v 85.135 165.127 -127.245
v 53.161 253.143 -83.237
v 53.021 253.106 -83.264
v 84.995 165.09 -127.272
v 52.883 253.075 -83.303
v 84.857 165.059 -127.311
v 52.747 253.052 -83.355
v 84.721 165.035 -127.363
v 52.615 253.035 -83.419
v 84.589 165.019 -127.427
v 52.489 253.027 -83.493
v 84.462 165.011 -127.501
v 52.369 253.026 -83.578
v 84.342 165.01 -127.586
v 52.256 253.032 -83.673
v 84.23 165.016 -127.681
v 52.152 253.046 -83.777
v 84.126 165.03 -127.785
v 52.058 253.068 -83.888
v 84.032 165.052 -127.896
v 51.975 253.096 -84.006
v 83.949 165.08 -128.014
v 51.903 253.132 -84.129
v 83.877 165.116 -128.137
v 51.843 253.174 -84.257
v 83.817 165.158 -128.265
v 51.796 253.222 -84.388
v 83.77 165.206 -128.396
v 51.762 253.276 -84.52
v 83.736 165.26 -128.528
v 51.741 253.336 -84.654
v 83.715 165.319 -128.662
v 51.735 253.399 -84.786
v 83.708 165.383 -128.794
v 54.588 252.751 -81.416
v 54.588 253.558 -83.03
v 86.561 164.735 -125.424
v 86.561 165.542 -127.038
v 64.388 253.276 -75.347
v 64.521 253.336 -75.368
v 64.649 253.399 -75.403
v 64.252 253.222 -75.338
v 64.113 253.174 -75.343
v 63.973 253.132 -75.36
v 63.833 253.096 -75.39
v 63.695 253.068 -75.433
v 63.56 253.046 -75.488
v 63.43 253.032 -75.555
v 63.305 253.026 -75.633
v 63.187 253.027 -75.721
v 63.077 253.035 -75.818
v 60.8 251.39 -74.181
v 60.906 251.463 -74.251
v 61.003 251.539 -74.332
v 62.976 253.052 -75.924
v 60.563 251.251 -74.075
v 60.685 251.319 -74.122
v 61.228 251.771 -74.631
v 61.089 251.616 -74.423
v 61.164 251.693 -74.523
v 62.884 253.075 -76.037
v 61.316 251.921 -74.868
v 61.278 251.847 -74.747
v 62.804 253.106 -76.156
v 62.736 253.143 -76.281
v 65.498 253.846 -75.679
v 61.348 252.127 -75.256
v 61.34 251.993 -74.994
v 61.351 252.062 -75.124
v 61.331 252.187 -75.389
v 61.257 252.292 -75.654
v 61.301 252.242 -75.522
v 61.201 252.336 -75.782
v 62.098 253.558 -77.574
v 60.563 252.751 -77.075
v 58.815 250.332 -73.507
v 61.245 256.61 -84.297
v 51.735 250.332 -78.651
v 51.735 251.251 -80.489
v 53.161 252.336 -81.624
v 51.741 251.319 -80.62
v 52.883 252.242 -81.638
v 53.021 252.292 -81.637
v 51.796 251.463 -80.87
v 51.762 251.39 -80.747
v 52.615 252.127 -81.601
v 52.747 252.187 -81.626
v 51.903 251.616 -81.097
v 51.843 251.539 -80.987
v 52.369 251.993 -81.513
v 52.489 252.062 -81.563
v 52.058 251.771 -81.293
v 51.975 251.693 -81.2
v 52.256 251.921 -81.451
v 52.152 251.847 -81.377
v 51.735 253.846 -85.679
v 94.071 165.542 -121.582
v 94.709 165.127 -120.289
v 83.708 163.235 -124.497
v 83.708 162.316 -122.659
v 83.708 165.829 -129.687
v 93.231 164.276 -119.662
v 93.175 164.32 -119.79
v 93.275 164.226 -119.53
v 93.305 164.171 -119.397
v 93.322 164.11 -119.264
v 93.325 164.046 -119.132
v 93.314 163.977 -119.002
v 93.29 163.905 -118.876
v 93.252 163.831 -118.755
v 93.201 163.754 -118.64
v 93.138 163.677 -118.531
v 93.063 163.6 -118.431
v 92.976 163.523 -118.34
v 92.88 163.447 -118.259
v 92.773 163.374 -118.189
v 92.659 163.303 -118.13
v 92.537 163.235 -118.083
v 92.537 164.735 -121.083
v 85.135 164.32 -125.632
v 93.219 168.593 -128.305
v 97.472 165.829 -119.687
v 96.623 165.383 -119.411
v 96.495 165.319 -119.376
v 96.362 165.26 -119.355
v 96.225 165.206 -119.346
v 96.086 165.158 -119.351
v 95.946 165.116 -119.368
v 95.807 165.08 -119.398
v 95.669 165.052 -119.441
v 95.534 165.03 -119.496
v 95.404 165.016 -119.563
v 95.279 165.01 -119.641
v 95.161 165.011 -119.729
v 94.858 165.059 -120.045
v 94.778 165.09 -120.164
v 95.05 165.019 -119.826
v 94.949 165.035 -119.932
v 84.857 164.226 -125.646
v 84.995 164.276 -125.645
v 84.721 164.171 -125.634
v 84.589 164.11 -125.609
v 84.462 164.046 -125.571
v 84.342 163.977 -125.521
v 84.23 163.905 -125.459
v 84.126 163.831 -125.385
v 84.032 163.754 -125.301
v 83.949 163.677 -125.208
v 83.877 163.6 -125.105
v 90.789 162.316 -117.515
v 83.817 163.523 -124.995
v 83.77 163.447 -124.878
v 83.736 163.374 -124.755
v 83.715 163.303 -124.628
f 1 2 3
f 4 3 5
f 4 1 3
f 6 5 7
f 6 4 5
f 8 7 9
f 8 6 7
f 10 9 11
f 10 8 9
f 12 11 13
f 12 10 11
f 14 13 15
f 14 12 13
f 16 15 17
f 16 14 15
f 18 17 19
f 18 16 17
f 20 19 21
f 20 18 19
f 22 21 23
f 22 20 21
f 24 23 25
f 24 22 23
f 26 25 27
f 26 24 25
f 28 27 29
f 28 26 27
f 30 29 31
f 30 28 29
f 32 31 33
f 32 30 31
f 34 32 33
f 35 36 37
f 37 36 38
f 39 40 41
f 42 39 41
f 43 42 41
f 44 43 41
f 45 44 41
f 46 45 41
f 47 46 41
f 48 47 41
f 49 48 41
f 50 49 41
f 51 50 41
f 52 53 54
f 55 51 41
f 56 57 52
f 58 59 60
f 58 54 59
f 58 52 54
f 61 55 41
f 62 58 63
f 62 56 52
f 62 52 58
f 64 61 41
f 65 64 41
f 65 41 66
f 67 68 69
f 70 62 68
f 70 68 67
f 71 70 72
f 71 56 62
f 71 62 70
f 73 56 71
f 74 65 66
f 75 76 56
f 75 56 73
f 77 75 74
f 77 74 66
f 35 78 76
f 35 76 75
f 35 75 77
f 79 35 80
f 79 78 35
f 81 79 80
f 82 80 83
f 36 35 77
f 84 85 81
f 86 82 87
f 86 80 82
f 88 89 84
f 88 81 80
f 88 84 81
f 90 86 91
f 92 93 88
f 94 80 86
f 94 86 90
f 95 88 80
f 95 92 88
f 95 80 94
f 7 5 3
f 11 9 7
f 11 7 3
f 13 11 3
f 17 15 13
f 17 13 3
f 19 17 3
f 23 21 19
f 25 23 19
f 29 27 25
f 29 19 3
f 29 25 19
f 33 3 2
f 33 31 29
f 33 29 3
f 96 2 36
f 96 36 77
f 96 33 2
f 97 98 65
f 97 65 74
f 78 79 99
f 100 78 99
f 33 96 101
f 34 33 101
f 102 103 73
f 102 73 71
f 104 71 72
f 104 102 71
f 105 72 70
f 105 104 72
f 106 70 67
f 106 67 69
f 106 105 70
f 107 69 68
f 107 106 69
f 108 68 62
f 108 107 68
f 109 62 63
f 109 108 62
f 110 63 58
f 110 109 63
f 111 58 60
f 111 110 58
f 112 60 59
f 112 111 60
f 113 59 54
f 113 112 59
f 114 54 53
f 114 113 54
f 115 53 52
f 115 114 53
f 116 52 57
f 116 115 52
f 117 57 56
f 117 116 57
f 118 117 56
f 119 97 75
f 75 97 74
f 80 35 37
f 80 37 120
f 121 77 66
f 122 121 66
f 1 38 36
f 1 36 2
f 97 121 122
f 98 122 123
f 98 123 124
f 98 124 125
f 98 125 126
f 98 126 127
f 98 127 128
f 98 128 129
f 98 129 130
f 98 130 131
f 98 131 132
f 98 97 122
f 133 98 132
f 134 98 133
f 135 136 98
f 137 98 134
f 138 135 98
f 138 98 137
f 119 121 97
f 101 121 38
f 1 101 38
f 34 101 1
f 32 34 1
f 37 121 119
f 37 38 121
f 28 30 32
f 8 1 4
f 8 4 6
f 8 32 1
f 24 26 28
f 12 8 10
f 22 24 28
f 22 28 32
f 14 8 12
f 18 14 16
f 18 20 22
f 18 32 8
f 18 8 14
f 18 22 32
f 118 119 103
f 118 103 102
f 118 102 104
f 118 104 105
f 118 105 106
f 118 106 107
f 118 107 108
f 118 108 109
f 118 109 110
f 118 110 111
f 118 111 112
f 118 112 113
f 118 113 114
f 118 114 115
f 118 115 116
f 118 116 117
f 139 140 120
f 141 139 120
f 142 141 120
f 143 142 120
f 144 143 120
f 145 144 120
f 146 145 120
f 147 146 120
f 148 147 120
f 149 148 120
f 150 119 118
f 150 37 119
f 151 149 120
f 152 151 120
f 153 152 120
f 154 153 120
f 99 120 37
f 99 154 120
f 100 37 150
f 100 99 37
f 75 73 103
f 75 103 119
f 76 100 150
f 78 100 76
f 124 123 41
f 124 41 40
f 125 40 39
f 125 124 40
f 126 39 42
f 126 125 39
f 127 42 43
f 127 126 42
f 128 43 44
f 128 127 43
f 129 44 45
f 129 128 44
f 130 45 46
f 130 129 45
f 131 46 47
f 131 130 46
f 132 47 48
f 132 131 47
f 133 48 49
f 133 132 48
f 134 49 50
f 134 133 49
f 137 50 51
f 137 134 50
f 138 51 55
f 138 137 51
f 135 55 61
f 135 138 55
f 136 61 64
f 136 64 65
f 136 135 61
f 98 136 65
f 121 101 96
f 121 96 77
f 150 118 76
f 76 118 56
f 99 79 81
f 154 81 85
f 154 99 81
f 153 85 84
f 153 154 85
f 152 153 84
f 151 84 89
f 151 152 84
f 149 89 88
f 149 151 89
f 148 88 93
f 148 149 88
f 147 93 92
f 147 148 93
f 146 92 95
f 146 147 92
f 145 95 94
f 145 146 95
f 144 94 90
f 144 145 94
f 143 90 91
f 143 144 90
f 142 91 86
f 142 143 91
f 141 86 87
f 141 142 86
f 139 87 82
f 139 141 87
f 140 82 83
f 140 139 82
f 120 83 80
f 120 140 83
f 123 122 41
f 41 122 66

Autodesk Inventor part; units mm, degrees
sketch "Boceto2" plane through (0, 0, 0) normal (0, 1, 0) x (-1, 0, 0)
  line L0 (0, -100.3768) -> (-95.464, -31.0181)
  line L1 (-95.464, -31.0181) -> (-59, 81.2065)
  line L2 (-59, 81.2065) -> (59, 81.2065)
  line L3 (59, 81.2065) -> (95.464, -31.0181)
  line L4 (95.464, -31.0181) -> (0, -100.3768)
  line L5 (0, 0) -> (162.4131, 0) construction
  line L6 (162.4131, 0) -> (162.4131, 162.4131) construction
  line L7 (162.4131, 162.4131) -> (0, 162.4131) construction
  line L8 (0, 162.4131) -> (0, 0) construction
  line L9 (162.4131, 162.4131) -> (0, 81.2065) construction
  dimension "Lado" = 118
  dimension "d1" = 26.565
  dimension "d2" = 262.7899
extrude "Extrusión1" add sketch "Boceto2" along normal blind 262.7899 draft 26.565
sketch "Boceto3" plane through (0, 262.7899, 0) normal (0, 1, 0) x (1, 0, 0)
  line L0 (0, -100.3768) -> (-95.464, -31.0181)
  line L1 (-95.464, -31.0181) -> (-59, 81.2065)
  line L2 (-59, 81.2065) -> (59, 81.2065)
  line L3 (59, 81.2065) -> (95.464, -31.0181)
  line L4 (95.464, -31.0181) -> (0, -100.3768)
  point P0 (0, 0)
  point P1 (0, 0)
  dimension "d5" = 118
extrude "Extrusión2" cut sketch "Boceto3" against normal blind 262.7899 draft 26.565 keep common part
sketch "Boceto4" plane through (-95.464, 262.7899, 31.0181) normal (-0.5257311, 0.4472136, 0.7236068) x (0.809017, 0, 0.5877853)
  line L0 (-36.464, -112.2247) -> (59, -181.5833) projected
  line L1 (59, -181.5833) -> (154.464, -112.2247) projected
  line L2 (118, 0) -> (154.464, -112.2247) projected
  line L3 (118, 0) -> (0, 0) projected
  line L4 (0, 0) -> (-36.464, -112.2247) projected
  line L5 (59, -167.9866) -> (-23.5327, -108.023)
  line L6 (-23.5327, -108.023) -> (7.992, -11)
  line L7 (7.992, -11) -> (110.008, -11)
  line L8 (110.008, -11) -> (141.5327, -108.023)
  line L9 (141.5327, -108.023) -> (59, -167.9866)
  point P0 (59, -198.7297)
  dimension "Ancho_Marco" = 11
extrude "Extrusión3" cut sketch "Boceto4" against normal blind 162.7899 contours L5 L6 L7 L8 L9
sketch "Boceto5" plane through (-59, 0, 81.2065) normal (0, -0.4472136, 0.8944272) x (1, 0, 0)
  line L0 (-36.464, 112.2247) -> (59, 181.5833) projected
  line L1 (0, 0) -> (-36.464, 112.2247) projected
  line L2 (0, 0) -> (118, 0) projected
  line L3 (118, 0) -> (154.464, 112.2247) projected
  line L4 (59, 181.5833) -> (154.464, 112.2247) projected
  line L5 (-23.5327, 108.023) -> (59, 167.9866)
  line L6 (59, 167.9866) -> (141.5327, 108.023)
  line L7 (141.5327, 108.023) -> (110.008, 11)
  line L8 (110.008, 11) -> (7.992, 11)
  line L9 (7.992, 11) -> (-23.5327, 108.023)
  point P0 (59, -36.3167)
  dimension "d11" = 11
sketch "Boceto6" plane through (-95.464, 0, -31.0181) normal (-0.8506508, -0.4472136, 0.2763932) x (0.309017, 0, 0.9510565)
  line L0 (-36.464, 112.2247) -> (59, 181.5833) projected
  line L1 (0, 0) -> (-36.464, 112.2247) projected
  line L2 (0, 0) -> (118, 0) projected
  line L3 (118, 0) -> (154.464, 112.2247) projected
  line L4 (59, 181.5833) -> (154.464, 112.2247) projected
  line L5 (-23.5327, 108.023) -> (59, 167.9866)
  line L6 (59, 167.9866) -> (141.5327, 108.023)
  line L7 (141.5327, 108.023) -> (110.008, 11)
  line L8 (110.008, 11) -> (7.992, 11)
  line L9 (7.992, 11) -> (-23.5327, 108.023)
  point P0 (59, -36.3167)
  dimension "d12" = 11
sketch "Boceto7" plane through (-59, 262.7899, -81.2065) normal (-0.8506508, 0.4472136, -0.2763932) x (-0.309017, 0, 0.9510565)
  line L0 (-36.464, -112.2247) -> (59, -181.5833) projected
  line L1 (59, -181.5833) -> (154.464, -112.2247) projected
  line L2 (118, 0) -> (154.464, -112.2247) projected
  line L3 (118, 0) -> (0, 0) projected
  line L4 (0, 0) -> (-36.464, -112.2247) projected
  line L5 (59, -167.9866) -> (-23.5327, -108.023)
  line L6 (-23.5327, -108.023) -> (7.992, -11)
  line L7 (7.992, -11) -> (110.008, -11)
  line L8 (110.008, -11) -> (141.5327, -108.023)
  line L9 (141.5327, -108.023) -> (59, -167.9866)
  point P0 (59, -198.7297)
  dimension "d13" = 11
sketch "Boceto8" plane through (0, 262.7899, 0) normal (0, 1, 0) x (1, 0, 0)
  line L0 (-59, 81.2065) -> (59, 81.2065) projected
  line L1 (-95.464, -31.0181) -> (-59, 81.2065) projected
  line L2 (0, -100.3768) -> (-95.464, -31.0181) projected
  line L3 (95.464, -31.0181) -> (0, -100.3768) projected
  line L4 (59, 81.2065) -> (95.464, -31.0181) projected
  line L5 (-82.5327, -26.8165) -> (-51.008, 70.2065)
  line L6 (-51.008, 70.2065) -> (51.008, 70.2065)
  line L7 (51.008, 70.2065) -> (82.5327, -26.8165)
  line L8 (82.5327, -26.8165) -> (0, -86.78)
  line L9 (0, -86.78) -> (-82.5327, -26.8165)
  point P0 (0, 0)
  dimension "d14" = 11
sketch "Boceto9" plane through (0, 262.7899, 100.3768) normal (0.5257311, 0.4472136, 0.7236068) x (0.809017, 0, -0.5877853)
  line L0 (-36.464, -112.2247) -> (59, -181.5833) projected
  line L1 (59, -181.5833) -> (154.464, -112.2247) projected
  line L2 (118, 0) -> (154.464, -112.2247) projected
  line L3 (118, 0) -> (0, 0) projected
  line L4 (0, 0) -> (-36.464, -112.2247) projected
  line L5 (7.992, -11) -> (110.008, -11)
  line L6 (110.008, -11) -> (141.5327, -108.023)
  line L7 (141.5327, -108.023) -> (59, -167.9866)
  line L8 (59, -167.9866) -> (-23.5327, -108.023)
  line L9 (-23.5327, -108.023) -> (7.992, -11)
  point P0 (59, -198.7297)
  dimension "d15" = 11
extrude "Extrusión4" cut sketch "Boceto7" against normal blind 162.7899 contours L5 L6 L7 L8 L9
extrude "Extrusión5" cut sketch "Boceto8" against normal blind 162.7899 contours L5 L6 L7 L8 L9
extrude "Extrusión6" cut sketch "Boceto9" against normal blind 162.7899 contours L5 L6 L7 L8 L9
extrude "Extrusión7" cut sketch "Boceto5" against normal blind 162.7899 contours L5 L6 L7 L8 L9
extrude "Extrusión8" cut sketch "Boceto6" against normal blind 162.7899 contours L5 L6 L7 L8 L9
sketch "Boceto10" plane through (59, 0, 81.2065) normal (0.8506508, -0.4472136, 0.2763932) x (0.309017, 0, -0.9510565)
  line L0 (59, 181.5833) -> (154.464, 112.2247) projected
  line L1 (-36.464, 112.2247) -> (59, 181.5833) projected
  line L2 (0, 0) -> (-36.464, 112.2247) projected
  line L3 (0, 0) -> (118, 0) projected
  line L4 (118, 0) -> (154.464, 112.2247) projected
  line L5 (-23.5327, 108.023) -> (59, 167.9866)
  line L6 (59, 167.9866) -> (141.5327, 108.023)
  line L7 (141.5327, 108.023) -> (110.008, 11)
  line L8 (110.008, 11) -> (7.992, 11)
  line L9 (7.992, 11) -> (-23.5327, 108.023)
  point P0 (59, -36.3167)
  dimension "d26" = 11
sketch "Boceto11" plane through (0, 0, 0) normal (0, -1, 0) x (1, 0, 0)
  line L0 (-59, 81.2065) -> (59, 81.2065) projected
  line L1 (-82.5327, 26.8165) -> (0, 86.78) projected
  line L2 (-95.464, -31.0181) -> (-59, 81.2065) projected
  line L3 (0, -100.3768) -> (-95.464, -31.0181) projected
  line L4 (95.464, -31.0181) -> (0, -100.3768) projected
  line L5 (59, 81.2065) -> (95.464, -31.0181) projected
  line L6 (-59, 81.2065) -> (59, 81.2065) projected
  line L7 (-51.008, 70.2065) -> (-82.5327, -26.8165)
  line L8 (-82.5327, -26.8165) -> (0, -86.78)
  line L9 (0, -86.78) -> (82.5327, -26.8165)
  line L10 (82.5327, -26.8165) -> (51.008, 70.2065)
  line L11 (51.008, 70.2065) -> (-51.008, 70.2065)
  point P0 (0, 0)
  point P1 (-22.8115, 70.2065)
  point P2 (-59.7212, 43.39)
  dimension "d27" = 11
sketch "Boceto12" plane through (0, 0, -100.3768) normal (-0.5257311, -0.4472136, -0.7236068) x (-0.809017, 0, 0.5877853)
  line L0 (78.4833, 87.5371) -> (69.2036, 84.5219) projected
  line L1 (59, 181.5833) -> (154.464, 112.2247) projected
  line L2 (-36.464, 112.2247) -> (59, 181.5833) projected
  line L3 (0, 0) -> (-36.464, 112.2247) projected
  line L4 (0, 0) -> (118, 0) projected
  line L5 (118, 0) -> (154.464, 112.2247) projected
  line L6 (141.5327, 108.023) -> (59, 167.9866)
  line L7 (59, 167.9866) -> (-23.5327, 108.023)
  line L8 (-23.5327, 108.023) -> (7.992, 11)
  line L9 (7.992, 11) -> (110.008, 11)
  line L10 (110.008, 11) -> (141.5327, 108.023)
  point P0 (59, -36.3167)
  point P1 (59, 91.9353)
  point P2 (69, 94.9704)
  point P3 (69.2036, 84.5219)
  dimension "d28" = 11
sketch "Boceto13" plane through (59, 262.7899, -81.2065) normal (0, 0.4472136, -0.8944272) x (-1, 0, 0)
  line L0 (59, -181.5833) -> (154.464, -112.2247) projected
  line L1 (118, 0) -> (154.464, -112.2247) projected
  line L2 (118, 0) -> (0, 0) projected
  line L3 (0, 0) -> (-36.464, -112.2247) projected
  line L4 (-36.464, -112.2247) -> (59, -181.5833) projected
  line L5 (141.5327, -108.023) -> (59, -167.9866)
  line L6 (59, -167.9866) -> (-23.5327, -108.023)
  line L7 (-23.5327, -108.023) -> (7.992, -11)
  line L8 (7.992, -11) -> (110.008, -11)
  line L9 (110.008, -11) -> (141.5327, -108.023)
  point P0 (59, -198.7297)
  dimension "d29" = 11
sketch "Boceto14" plane through (95.464, 262.7899, 31.0181) normal (0.8506508, 0.4472136, -0.2763932) x (-0.309017, 0, -0.9510565)
  line L0 (59, -181.5833) -> (154.464, -112.2247) projected
  line L1 (118, 0) -> (154.464, -112.2247) projected
  line L2 (118, 0) -> (0, 0) projected
  line L3 (0, 0) -> (-36.464, -112.2247) projected
  line L4 (-36.464, -112.2247) -> (59, -181.5833) projected
  line L5 (141.5327, -108.023) -> (59, -167.9866)
  line L6 (59, -167.9866) -> (-23.5327, -108.023)
  line L7 (-23.5327, -108.023) -> (7.992, -11)
  line L8 (7.992, -11) -> (110.008, -11)
  line L9 (110.008, -11) -> (141.5327, -108.023)
  point P0 (59, -198.7297)
  dimension "d30" = 11
sketch "Boceto15" plane through (95.464, 0, -31.0181) normal (0.5257311, -0.4472136, -0.7236068) x (-0.809017, 0, -0.5877853)
  line L0 (59, 181.5833) -> (154.464, 112.2247) projected
  line L1 (-36.464, 112.2247) -> (59, 181.5833) projected
  line L2 (0, 0) -> (-36.464, 112.2247) projected
  line L3 (0, 0) -> (118, 0) projected
  line L4 (118, 0) -> (154.464, 112.2247) projected
  line L5 (141.5327, 108.023) -> (59, 167.9866)
  line L6 (59, 167.9866) -> (-23.5327, 108.023)
  line L7 (-23.5327, 108.023) -> (7.992, 11)
  line L8 (7.992, 11) -> (110.008, 11)
  line L9 (110.008, 11) -> (141.5327, 108.023)
  point P0 (59, -36.3167)
  dimension "d31" = 11
extrude "Extrusión9" cut sketch "Boceto13" against normal blind 162.7899 contours L5 L6 L7 L8 L9
extrude "Extrusión10" cut sketch "Boceto15" against normal blind 162.7899 contours L9 L8 L7 L6 L5
extrude "Extrusión11" cut sketch "Boceto14" against normal blind 162.7899 contours L5 L6 L7 L8 L9
extrude "Extrusión12" cut sketch "Boceto12" against normal blind 162.7899 contours L10 L9 L8 L7 L6
extrude "Extrusión13" cut sketch "Boceto11" against normal blind 162.7899 contours L11 L10 L9 L8 L7 L1 | L1 L7 L11
extrude "Extrusión14" cut sketch "Boceto10" against normal blind 162.7899 contours L5 L6 L7 L8 L9
ref_plane "Plano de trabajo1" through (93.3374, 261.6718, 31.7091) normal (0.8506508, 0.4472136, -0.2763932) x (-0.309017, 0, -0.9510565)
sketch "Boceto17" plane through (93.3374, 261.6718, 31.7091) normal (0.8506508, 0.4472136, -0.2763932) x (-0.309017, 0, -0.9510565)
  line L0 (-23.5327, -108.023) -> (7.992, -11) projected
  line L1 (7.992, -11) -> (110.008, -11) projected
  line L2 (110.008, -11) -> (141.5327, -108.023) projected
  line L3 (141.5327, -108.023) -> (59, -167.9866) projected
  line L4 (59, -167.9866) -> (-23.5327, -108.023) projected
  line L5 (59, -181.5833) -> (154.464, -112.2247) projected
  line L6 (118, 0) -> (154.464, -112.2247) projected
  line L7 (118, 0) -> (0, 0) projected
  line L8 (0, 0) -> (-36.464, -112.2247) projected
  line L9 (-36.464, -112.2247) -> (59, -181.5833) projected
  line L10 (59, -172.9309) -> (146.235, -109.5509)
  line L11 (146.235, -109.5509) -> (112.9142, -7)
  line L12 (112.9142, -7) -> (5.0858, -7)
  line L13 (5.0858, -7) -> (-28.235, -109.5509)
  line L14 (-28.235, -109.5509) -> (59, -172.9309)
  point P0 (59, -198.7297)
  dimension "d48" = 4
extrude "Extrusión15" cut sketch "Boceto17" against normal blind 1.8 contours L14 L13 L12 L11 L10
ref_plane "Plano de trabajo4" through (61.2404, 249.7138, -72.2169) normal (0.5, 0.5257311, -0.688191) x (0.309017, -0.8506508, -0.4253254)
ref_plane "Plano de trabajo3" through (62.4904, 251.0281, -73.9374) normal (0.5, 0.5257311, -0.688191) x (0.309017, -0.8506508, -0.4253254)
ref_plane "Plano de trabajo5" through (97.6729, 166.1711, -118.5159) normal (0.5, -0.8506508, 0.1624598) x (-0.8506508, -0.4472136, 0.2763932)
ref_plane "Plano de trabajo6" through (82.5327, 166.1711, -129.5159) normal (-0.309017, -0.8506508, -0.4253254) x (0, -0.4472136, 0.8944272)
split "Dividir2" plane through (97.6729, 166.1711, -118.5159) removes the side toward (0.5, -0.8506508, 0.1624598)
split "Dividir3" plane through (82.5327, 166.1711, -129.5159) removes the side toward (-0.309017, -0.8506508, -0.4253254)
ref_plane "Plano de trabajo7" through (66.1482, 252.9512, -75.1259) normal (0, 0.5257311, 0.8506508) x (-0.8506508, -0.4472136, 0.2763932)
ref_plane "Plano de trabajo8" through (51.008, 252.9512, -86.1259) normal (-0.809017, 0.5257311, 0.2628656) x (0, -0.4472136, 0.8944272)
split "Dividir4" plane through (66.1482, 252.9512, -75.1259) removes the side toward (0, 0.5257311, 0.8506508)
split "Dividir5" plane through (51.008, 252.9512, -86.1259) removes the side toward (-0.809017, 0.5257311, 0.2628656)
split "Dividir6" plane through (61.2404, 249.7138, -72.2169) removes the side toward (-0.5, -0.5257311, 0.688191)
ref_plane "Plano de trabajo9" through (-14.2309, 126.771, 19.5872) normal (-0.809017, 0, -0.5877853) x (0.5773503, 0.1875925, -0.7946545)
mirror "Simetría1" about plane through (-14.2309, 126.771, 19.5872) normal (-0.809017, 0, -0.5877853) of "Extrusión15"
sketch "Boceto19" plane through (91.5151, 162.9338, -116.5151) normal (-0.5, -0.5257311, 0.688191) x (0.809017, 0, 0.5877853)
  line L0 (-5.5514, -3.431) -> (-11.1029, 0) projected
  line L1 (0, 0) -> (-5.5514, -3.431) projected
  line L2 (0, 102.0161) -> (0, 0) projected
  line L3 (-5.5514, 105.447) -> (0, 102.0161) projected
  line L4 (-11.1029, 102.0161) -> (-5.5514, 105.447) projected
  line L5 (-11.1029, 0) -> (-11.1029, 102.0161) projected
  point P0 (-5.5514, -60.7632)
  dimension "d54" = 11.1029
  dimension "d55" = 102.0161
sketch "Boceto20" plane through (91.8062, 260.8668, 32.2066) normal (0.8506508, 0.4472136, -0.2763932) x (-0.309017, 0, -0.9510565)
  line L0 (112.9142, -7) -> (110.008, -11) projected
  line L1 (141.5327, -108.023) -> (110.008, -11) projected
  line L2 (141.5327, -108.023) -> (146.235, -109.5509) projected
  line L3 (112.9142, -7) -> (146.235, -109.5509) projected
  point P0 (59, -198.7297)
fillet "Empalme1" radius 1 4 edges at (79.7857, 208.444, -96.1305) (78.2511, 207.6372, -95.6319) (66.7704, 208.444, -105.5866) (66.7704, 207.6372, -103.9731)
sketch "Boceto21" plane through (95.464, 162.4131, -131.3949) normal (0, 0.4472136, -0.8944272) x (-0.9510565, 0.2763932, 0.1381966)
  line L0 (69.3587, 95.464) -> (0, 0) projected
  line L1 (73.5603, 82.5327) -> (69.3587, 95.464) projected
  line L2 (69.3587, 95.464) -> (0, 0) projected
  line L3 (0, 0) -> (13.5967, 0) projected
  line L4 (13.5967, 0) -> (73.5603, 82.5327) projected
  line L5 (13.5967, 0) -> (7.992, 11)
  line L6 (13.5967, 0) -> (25.9423, 0) construction
  point P0 (64.0601, -111.7712)
  dimension "d63" = 126
  dimension "d64" = 117
sketch "Boceto22" plane through (97.6729, 166.1711, -118.5159) normal (0.8506508, 0.4472136, -0.2763932) x (-0.1624598, -0.2763932, -0.9472136)
  line L0 (-55.7619, 95.464) -> (-59.9635, 82.5327) projected
  line L1 (-59.9635, 82.5327) -> (0, 0) projected
  line L2 (0, 0) -> (13.5967, 0) projected
  line L3 (-55.7619, 95.464) -> (13.5967, 0) projected
  line L4 (-59.9635, 82.5327) -> (0, 0) projected
  line L5 (1.2361, 0) -> (-59.5816, 83.7083) projected
  point P0 (-50.4634, -111.7712)
  dimension "d65" = 11
sketch "Boceto23" plane through (93.2119, 162.8815, -122.0107) normal (0.5, -0.8506508, 0.1624598) x (0.8506508, 0.4472136, -0.2763932)
  ellipse E0 centre (-1, 3.7082) end of major axis (-1, 4.9443) minor radius 1 (0, 3.7082) -> (-1, 4.9443) ccw projected
  line L0 (-1, 4.9443) -> (-2.9389, 4.9443) projected
  line L1 (-2.9389, 4.9443) -> (-5.8575, -0.8928) projected
  line L2 (-5.8575, -0.8928) -> (4.3, -8.6525) projected
  line L3 (4.3, 4.9443) -> (4.3, -8.6525) projected
  line L4 (4.3, 4.9443) -> (2.8, 4.9443) projected
  ellipse E1 centre (2.8, 3.7082) end of major axis (2.8, 4.9443) minor radius 1 (2.8, 4.9443) -> (1.8, 3.7082) ccw projected
  line L5 (1.8, 0) -> (1.8, 3.7082) projected
  line L6 (1.8, 0) -> (0, 0) projected
  line L7 (0, 3.7082) -> (0, 0) projected
  line L8 (1.8, 0) -> (1.8, 4.9443)
  point P0 (-185.8565, 55.4077)
  dimension "d67" = 4.9443
extrude "Extrusión16" cut sketch "Boceto22" against normal blind 10 contours L5 L2 L1 L0
sketch "Boceto24" plane through (95.464, 162.4131, -131.3949) normal (0, 0.4472136, -0.8944272) x (-0.9510565, 0.2763932, 0.1381966)
  line L0 (73.5603, 82.5327) -> (69.3587, 95.464) projected
  line L1 (69.3587, 95.464) -> (0, 0) projected
  line L2 (0, 0) -> (13.5967, 0) projected
  line L3 (13.5967, 0) -> (73.5603, 82.5327) projected
  line L4 (13.5967, 0) -> (73.5603, 82.5327) projected
  line L5 (13.5967, 0) -> (73.5603, 82.5327) projected
  line L6 (73.1783, 83.7083) -> (12.3607, 0) projected
  point P0 (64.0601, -111.7712)
extrude "Extrusión17" cut sketch "Boceto24" against normal blind 10 contours L3 L2 L6 L0
fillet "Empalme2" radius 1.5 2 edges at (67.7214, 208.7204, -105.4484) (67.7214, 207.9136, -103.8349)
fillet "Empalme3" radius 1.5 2 edges at (77.8258, 207.9136, -96.4937) (79.3603, 208.7204, -96.9923)
ref_plane "Plano de trabajo11" through (51.7346, 211.3253, -0.6381) normal (-0.309017, 0.8506508, 0.4253254) x (0, -0.4472136, 0.8944272)
split "Dividir7" plane through (51.7346, 211.3253, -0.6381) removes the side toward (-0.309017, 0.8506508, 0.4253254)
ref_plane "Plano de trabajo12" through (83.7083, 123.3092, -44.6461) normal (-0.309017, 0.8506508, 0.4253254) x (0, 0.4472136, -0.8944272)
split "Dividir8" plane through (83.7083, 123.3092, -44.6461) removes the side toward (0.309017, -0.8506508, -0.4253254)
ref_plane "Plano de trabajo2" through (59.2794, 271.8594, -65.6718) normal (0.5, 0.5257311, -0.688191) x (0.309017, -0.8506508, -0.4253254)
equation "\"d3\" = d2"
equation "\"d4\" = d1"
equation "\"d5\" = Lado"
equation "\"d6\" = d2"
equation "\"d7\" = d1"
equation "\"d11\" = Ancho_Marco"
equation "\"d12\" = Ancho_Marco"
equation "\"d13\" = Ancho_Marco"
equation "\"d14\" = Ancho_Marco"
equation "\"d15\" = Ancho_Marco"
equation "\"d26\" = Ancho_Marco"
equation "\"d27\" = Ancho_Marco"
equation "\"d28\" = Ancho_Marco"
equation "\"d29\" = Ancho_Marco"
equation "\"d30\" = Ancho_Marco"
equation "\"d31\" = Ancho_Marco"
properties part number "Perfil_V3"
